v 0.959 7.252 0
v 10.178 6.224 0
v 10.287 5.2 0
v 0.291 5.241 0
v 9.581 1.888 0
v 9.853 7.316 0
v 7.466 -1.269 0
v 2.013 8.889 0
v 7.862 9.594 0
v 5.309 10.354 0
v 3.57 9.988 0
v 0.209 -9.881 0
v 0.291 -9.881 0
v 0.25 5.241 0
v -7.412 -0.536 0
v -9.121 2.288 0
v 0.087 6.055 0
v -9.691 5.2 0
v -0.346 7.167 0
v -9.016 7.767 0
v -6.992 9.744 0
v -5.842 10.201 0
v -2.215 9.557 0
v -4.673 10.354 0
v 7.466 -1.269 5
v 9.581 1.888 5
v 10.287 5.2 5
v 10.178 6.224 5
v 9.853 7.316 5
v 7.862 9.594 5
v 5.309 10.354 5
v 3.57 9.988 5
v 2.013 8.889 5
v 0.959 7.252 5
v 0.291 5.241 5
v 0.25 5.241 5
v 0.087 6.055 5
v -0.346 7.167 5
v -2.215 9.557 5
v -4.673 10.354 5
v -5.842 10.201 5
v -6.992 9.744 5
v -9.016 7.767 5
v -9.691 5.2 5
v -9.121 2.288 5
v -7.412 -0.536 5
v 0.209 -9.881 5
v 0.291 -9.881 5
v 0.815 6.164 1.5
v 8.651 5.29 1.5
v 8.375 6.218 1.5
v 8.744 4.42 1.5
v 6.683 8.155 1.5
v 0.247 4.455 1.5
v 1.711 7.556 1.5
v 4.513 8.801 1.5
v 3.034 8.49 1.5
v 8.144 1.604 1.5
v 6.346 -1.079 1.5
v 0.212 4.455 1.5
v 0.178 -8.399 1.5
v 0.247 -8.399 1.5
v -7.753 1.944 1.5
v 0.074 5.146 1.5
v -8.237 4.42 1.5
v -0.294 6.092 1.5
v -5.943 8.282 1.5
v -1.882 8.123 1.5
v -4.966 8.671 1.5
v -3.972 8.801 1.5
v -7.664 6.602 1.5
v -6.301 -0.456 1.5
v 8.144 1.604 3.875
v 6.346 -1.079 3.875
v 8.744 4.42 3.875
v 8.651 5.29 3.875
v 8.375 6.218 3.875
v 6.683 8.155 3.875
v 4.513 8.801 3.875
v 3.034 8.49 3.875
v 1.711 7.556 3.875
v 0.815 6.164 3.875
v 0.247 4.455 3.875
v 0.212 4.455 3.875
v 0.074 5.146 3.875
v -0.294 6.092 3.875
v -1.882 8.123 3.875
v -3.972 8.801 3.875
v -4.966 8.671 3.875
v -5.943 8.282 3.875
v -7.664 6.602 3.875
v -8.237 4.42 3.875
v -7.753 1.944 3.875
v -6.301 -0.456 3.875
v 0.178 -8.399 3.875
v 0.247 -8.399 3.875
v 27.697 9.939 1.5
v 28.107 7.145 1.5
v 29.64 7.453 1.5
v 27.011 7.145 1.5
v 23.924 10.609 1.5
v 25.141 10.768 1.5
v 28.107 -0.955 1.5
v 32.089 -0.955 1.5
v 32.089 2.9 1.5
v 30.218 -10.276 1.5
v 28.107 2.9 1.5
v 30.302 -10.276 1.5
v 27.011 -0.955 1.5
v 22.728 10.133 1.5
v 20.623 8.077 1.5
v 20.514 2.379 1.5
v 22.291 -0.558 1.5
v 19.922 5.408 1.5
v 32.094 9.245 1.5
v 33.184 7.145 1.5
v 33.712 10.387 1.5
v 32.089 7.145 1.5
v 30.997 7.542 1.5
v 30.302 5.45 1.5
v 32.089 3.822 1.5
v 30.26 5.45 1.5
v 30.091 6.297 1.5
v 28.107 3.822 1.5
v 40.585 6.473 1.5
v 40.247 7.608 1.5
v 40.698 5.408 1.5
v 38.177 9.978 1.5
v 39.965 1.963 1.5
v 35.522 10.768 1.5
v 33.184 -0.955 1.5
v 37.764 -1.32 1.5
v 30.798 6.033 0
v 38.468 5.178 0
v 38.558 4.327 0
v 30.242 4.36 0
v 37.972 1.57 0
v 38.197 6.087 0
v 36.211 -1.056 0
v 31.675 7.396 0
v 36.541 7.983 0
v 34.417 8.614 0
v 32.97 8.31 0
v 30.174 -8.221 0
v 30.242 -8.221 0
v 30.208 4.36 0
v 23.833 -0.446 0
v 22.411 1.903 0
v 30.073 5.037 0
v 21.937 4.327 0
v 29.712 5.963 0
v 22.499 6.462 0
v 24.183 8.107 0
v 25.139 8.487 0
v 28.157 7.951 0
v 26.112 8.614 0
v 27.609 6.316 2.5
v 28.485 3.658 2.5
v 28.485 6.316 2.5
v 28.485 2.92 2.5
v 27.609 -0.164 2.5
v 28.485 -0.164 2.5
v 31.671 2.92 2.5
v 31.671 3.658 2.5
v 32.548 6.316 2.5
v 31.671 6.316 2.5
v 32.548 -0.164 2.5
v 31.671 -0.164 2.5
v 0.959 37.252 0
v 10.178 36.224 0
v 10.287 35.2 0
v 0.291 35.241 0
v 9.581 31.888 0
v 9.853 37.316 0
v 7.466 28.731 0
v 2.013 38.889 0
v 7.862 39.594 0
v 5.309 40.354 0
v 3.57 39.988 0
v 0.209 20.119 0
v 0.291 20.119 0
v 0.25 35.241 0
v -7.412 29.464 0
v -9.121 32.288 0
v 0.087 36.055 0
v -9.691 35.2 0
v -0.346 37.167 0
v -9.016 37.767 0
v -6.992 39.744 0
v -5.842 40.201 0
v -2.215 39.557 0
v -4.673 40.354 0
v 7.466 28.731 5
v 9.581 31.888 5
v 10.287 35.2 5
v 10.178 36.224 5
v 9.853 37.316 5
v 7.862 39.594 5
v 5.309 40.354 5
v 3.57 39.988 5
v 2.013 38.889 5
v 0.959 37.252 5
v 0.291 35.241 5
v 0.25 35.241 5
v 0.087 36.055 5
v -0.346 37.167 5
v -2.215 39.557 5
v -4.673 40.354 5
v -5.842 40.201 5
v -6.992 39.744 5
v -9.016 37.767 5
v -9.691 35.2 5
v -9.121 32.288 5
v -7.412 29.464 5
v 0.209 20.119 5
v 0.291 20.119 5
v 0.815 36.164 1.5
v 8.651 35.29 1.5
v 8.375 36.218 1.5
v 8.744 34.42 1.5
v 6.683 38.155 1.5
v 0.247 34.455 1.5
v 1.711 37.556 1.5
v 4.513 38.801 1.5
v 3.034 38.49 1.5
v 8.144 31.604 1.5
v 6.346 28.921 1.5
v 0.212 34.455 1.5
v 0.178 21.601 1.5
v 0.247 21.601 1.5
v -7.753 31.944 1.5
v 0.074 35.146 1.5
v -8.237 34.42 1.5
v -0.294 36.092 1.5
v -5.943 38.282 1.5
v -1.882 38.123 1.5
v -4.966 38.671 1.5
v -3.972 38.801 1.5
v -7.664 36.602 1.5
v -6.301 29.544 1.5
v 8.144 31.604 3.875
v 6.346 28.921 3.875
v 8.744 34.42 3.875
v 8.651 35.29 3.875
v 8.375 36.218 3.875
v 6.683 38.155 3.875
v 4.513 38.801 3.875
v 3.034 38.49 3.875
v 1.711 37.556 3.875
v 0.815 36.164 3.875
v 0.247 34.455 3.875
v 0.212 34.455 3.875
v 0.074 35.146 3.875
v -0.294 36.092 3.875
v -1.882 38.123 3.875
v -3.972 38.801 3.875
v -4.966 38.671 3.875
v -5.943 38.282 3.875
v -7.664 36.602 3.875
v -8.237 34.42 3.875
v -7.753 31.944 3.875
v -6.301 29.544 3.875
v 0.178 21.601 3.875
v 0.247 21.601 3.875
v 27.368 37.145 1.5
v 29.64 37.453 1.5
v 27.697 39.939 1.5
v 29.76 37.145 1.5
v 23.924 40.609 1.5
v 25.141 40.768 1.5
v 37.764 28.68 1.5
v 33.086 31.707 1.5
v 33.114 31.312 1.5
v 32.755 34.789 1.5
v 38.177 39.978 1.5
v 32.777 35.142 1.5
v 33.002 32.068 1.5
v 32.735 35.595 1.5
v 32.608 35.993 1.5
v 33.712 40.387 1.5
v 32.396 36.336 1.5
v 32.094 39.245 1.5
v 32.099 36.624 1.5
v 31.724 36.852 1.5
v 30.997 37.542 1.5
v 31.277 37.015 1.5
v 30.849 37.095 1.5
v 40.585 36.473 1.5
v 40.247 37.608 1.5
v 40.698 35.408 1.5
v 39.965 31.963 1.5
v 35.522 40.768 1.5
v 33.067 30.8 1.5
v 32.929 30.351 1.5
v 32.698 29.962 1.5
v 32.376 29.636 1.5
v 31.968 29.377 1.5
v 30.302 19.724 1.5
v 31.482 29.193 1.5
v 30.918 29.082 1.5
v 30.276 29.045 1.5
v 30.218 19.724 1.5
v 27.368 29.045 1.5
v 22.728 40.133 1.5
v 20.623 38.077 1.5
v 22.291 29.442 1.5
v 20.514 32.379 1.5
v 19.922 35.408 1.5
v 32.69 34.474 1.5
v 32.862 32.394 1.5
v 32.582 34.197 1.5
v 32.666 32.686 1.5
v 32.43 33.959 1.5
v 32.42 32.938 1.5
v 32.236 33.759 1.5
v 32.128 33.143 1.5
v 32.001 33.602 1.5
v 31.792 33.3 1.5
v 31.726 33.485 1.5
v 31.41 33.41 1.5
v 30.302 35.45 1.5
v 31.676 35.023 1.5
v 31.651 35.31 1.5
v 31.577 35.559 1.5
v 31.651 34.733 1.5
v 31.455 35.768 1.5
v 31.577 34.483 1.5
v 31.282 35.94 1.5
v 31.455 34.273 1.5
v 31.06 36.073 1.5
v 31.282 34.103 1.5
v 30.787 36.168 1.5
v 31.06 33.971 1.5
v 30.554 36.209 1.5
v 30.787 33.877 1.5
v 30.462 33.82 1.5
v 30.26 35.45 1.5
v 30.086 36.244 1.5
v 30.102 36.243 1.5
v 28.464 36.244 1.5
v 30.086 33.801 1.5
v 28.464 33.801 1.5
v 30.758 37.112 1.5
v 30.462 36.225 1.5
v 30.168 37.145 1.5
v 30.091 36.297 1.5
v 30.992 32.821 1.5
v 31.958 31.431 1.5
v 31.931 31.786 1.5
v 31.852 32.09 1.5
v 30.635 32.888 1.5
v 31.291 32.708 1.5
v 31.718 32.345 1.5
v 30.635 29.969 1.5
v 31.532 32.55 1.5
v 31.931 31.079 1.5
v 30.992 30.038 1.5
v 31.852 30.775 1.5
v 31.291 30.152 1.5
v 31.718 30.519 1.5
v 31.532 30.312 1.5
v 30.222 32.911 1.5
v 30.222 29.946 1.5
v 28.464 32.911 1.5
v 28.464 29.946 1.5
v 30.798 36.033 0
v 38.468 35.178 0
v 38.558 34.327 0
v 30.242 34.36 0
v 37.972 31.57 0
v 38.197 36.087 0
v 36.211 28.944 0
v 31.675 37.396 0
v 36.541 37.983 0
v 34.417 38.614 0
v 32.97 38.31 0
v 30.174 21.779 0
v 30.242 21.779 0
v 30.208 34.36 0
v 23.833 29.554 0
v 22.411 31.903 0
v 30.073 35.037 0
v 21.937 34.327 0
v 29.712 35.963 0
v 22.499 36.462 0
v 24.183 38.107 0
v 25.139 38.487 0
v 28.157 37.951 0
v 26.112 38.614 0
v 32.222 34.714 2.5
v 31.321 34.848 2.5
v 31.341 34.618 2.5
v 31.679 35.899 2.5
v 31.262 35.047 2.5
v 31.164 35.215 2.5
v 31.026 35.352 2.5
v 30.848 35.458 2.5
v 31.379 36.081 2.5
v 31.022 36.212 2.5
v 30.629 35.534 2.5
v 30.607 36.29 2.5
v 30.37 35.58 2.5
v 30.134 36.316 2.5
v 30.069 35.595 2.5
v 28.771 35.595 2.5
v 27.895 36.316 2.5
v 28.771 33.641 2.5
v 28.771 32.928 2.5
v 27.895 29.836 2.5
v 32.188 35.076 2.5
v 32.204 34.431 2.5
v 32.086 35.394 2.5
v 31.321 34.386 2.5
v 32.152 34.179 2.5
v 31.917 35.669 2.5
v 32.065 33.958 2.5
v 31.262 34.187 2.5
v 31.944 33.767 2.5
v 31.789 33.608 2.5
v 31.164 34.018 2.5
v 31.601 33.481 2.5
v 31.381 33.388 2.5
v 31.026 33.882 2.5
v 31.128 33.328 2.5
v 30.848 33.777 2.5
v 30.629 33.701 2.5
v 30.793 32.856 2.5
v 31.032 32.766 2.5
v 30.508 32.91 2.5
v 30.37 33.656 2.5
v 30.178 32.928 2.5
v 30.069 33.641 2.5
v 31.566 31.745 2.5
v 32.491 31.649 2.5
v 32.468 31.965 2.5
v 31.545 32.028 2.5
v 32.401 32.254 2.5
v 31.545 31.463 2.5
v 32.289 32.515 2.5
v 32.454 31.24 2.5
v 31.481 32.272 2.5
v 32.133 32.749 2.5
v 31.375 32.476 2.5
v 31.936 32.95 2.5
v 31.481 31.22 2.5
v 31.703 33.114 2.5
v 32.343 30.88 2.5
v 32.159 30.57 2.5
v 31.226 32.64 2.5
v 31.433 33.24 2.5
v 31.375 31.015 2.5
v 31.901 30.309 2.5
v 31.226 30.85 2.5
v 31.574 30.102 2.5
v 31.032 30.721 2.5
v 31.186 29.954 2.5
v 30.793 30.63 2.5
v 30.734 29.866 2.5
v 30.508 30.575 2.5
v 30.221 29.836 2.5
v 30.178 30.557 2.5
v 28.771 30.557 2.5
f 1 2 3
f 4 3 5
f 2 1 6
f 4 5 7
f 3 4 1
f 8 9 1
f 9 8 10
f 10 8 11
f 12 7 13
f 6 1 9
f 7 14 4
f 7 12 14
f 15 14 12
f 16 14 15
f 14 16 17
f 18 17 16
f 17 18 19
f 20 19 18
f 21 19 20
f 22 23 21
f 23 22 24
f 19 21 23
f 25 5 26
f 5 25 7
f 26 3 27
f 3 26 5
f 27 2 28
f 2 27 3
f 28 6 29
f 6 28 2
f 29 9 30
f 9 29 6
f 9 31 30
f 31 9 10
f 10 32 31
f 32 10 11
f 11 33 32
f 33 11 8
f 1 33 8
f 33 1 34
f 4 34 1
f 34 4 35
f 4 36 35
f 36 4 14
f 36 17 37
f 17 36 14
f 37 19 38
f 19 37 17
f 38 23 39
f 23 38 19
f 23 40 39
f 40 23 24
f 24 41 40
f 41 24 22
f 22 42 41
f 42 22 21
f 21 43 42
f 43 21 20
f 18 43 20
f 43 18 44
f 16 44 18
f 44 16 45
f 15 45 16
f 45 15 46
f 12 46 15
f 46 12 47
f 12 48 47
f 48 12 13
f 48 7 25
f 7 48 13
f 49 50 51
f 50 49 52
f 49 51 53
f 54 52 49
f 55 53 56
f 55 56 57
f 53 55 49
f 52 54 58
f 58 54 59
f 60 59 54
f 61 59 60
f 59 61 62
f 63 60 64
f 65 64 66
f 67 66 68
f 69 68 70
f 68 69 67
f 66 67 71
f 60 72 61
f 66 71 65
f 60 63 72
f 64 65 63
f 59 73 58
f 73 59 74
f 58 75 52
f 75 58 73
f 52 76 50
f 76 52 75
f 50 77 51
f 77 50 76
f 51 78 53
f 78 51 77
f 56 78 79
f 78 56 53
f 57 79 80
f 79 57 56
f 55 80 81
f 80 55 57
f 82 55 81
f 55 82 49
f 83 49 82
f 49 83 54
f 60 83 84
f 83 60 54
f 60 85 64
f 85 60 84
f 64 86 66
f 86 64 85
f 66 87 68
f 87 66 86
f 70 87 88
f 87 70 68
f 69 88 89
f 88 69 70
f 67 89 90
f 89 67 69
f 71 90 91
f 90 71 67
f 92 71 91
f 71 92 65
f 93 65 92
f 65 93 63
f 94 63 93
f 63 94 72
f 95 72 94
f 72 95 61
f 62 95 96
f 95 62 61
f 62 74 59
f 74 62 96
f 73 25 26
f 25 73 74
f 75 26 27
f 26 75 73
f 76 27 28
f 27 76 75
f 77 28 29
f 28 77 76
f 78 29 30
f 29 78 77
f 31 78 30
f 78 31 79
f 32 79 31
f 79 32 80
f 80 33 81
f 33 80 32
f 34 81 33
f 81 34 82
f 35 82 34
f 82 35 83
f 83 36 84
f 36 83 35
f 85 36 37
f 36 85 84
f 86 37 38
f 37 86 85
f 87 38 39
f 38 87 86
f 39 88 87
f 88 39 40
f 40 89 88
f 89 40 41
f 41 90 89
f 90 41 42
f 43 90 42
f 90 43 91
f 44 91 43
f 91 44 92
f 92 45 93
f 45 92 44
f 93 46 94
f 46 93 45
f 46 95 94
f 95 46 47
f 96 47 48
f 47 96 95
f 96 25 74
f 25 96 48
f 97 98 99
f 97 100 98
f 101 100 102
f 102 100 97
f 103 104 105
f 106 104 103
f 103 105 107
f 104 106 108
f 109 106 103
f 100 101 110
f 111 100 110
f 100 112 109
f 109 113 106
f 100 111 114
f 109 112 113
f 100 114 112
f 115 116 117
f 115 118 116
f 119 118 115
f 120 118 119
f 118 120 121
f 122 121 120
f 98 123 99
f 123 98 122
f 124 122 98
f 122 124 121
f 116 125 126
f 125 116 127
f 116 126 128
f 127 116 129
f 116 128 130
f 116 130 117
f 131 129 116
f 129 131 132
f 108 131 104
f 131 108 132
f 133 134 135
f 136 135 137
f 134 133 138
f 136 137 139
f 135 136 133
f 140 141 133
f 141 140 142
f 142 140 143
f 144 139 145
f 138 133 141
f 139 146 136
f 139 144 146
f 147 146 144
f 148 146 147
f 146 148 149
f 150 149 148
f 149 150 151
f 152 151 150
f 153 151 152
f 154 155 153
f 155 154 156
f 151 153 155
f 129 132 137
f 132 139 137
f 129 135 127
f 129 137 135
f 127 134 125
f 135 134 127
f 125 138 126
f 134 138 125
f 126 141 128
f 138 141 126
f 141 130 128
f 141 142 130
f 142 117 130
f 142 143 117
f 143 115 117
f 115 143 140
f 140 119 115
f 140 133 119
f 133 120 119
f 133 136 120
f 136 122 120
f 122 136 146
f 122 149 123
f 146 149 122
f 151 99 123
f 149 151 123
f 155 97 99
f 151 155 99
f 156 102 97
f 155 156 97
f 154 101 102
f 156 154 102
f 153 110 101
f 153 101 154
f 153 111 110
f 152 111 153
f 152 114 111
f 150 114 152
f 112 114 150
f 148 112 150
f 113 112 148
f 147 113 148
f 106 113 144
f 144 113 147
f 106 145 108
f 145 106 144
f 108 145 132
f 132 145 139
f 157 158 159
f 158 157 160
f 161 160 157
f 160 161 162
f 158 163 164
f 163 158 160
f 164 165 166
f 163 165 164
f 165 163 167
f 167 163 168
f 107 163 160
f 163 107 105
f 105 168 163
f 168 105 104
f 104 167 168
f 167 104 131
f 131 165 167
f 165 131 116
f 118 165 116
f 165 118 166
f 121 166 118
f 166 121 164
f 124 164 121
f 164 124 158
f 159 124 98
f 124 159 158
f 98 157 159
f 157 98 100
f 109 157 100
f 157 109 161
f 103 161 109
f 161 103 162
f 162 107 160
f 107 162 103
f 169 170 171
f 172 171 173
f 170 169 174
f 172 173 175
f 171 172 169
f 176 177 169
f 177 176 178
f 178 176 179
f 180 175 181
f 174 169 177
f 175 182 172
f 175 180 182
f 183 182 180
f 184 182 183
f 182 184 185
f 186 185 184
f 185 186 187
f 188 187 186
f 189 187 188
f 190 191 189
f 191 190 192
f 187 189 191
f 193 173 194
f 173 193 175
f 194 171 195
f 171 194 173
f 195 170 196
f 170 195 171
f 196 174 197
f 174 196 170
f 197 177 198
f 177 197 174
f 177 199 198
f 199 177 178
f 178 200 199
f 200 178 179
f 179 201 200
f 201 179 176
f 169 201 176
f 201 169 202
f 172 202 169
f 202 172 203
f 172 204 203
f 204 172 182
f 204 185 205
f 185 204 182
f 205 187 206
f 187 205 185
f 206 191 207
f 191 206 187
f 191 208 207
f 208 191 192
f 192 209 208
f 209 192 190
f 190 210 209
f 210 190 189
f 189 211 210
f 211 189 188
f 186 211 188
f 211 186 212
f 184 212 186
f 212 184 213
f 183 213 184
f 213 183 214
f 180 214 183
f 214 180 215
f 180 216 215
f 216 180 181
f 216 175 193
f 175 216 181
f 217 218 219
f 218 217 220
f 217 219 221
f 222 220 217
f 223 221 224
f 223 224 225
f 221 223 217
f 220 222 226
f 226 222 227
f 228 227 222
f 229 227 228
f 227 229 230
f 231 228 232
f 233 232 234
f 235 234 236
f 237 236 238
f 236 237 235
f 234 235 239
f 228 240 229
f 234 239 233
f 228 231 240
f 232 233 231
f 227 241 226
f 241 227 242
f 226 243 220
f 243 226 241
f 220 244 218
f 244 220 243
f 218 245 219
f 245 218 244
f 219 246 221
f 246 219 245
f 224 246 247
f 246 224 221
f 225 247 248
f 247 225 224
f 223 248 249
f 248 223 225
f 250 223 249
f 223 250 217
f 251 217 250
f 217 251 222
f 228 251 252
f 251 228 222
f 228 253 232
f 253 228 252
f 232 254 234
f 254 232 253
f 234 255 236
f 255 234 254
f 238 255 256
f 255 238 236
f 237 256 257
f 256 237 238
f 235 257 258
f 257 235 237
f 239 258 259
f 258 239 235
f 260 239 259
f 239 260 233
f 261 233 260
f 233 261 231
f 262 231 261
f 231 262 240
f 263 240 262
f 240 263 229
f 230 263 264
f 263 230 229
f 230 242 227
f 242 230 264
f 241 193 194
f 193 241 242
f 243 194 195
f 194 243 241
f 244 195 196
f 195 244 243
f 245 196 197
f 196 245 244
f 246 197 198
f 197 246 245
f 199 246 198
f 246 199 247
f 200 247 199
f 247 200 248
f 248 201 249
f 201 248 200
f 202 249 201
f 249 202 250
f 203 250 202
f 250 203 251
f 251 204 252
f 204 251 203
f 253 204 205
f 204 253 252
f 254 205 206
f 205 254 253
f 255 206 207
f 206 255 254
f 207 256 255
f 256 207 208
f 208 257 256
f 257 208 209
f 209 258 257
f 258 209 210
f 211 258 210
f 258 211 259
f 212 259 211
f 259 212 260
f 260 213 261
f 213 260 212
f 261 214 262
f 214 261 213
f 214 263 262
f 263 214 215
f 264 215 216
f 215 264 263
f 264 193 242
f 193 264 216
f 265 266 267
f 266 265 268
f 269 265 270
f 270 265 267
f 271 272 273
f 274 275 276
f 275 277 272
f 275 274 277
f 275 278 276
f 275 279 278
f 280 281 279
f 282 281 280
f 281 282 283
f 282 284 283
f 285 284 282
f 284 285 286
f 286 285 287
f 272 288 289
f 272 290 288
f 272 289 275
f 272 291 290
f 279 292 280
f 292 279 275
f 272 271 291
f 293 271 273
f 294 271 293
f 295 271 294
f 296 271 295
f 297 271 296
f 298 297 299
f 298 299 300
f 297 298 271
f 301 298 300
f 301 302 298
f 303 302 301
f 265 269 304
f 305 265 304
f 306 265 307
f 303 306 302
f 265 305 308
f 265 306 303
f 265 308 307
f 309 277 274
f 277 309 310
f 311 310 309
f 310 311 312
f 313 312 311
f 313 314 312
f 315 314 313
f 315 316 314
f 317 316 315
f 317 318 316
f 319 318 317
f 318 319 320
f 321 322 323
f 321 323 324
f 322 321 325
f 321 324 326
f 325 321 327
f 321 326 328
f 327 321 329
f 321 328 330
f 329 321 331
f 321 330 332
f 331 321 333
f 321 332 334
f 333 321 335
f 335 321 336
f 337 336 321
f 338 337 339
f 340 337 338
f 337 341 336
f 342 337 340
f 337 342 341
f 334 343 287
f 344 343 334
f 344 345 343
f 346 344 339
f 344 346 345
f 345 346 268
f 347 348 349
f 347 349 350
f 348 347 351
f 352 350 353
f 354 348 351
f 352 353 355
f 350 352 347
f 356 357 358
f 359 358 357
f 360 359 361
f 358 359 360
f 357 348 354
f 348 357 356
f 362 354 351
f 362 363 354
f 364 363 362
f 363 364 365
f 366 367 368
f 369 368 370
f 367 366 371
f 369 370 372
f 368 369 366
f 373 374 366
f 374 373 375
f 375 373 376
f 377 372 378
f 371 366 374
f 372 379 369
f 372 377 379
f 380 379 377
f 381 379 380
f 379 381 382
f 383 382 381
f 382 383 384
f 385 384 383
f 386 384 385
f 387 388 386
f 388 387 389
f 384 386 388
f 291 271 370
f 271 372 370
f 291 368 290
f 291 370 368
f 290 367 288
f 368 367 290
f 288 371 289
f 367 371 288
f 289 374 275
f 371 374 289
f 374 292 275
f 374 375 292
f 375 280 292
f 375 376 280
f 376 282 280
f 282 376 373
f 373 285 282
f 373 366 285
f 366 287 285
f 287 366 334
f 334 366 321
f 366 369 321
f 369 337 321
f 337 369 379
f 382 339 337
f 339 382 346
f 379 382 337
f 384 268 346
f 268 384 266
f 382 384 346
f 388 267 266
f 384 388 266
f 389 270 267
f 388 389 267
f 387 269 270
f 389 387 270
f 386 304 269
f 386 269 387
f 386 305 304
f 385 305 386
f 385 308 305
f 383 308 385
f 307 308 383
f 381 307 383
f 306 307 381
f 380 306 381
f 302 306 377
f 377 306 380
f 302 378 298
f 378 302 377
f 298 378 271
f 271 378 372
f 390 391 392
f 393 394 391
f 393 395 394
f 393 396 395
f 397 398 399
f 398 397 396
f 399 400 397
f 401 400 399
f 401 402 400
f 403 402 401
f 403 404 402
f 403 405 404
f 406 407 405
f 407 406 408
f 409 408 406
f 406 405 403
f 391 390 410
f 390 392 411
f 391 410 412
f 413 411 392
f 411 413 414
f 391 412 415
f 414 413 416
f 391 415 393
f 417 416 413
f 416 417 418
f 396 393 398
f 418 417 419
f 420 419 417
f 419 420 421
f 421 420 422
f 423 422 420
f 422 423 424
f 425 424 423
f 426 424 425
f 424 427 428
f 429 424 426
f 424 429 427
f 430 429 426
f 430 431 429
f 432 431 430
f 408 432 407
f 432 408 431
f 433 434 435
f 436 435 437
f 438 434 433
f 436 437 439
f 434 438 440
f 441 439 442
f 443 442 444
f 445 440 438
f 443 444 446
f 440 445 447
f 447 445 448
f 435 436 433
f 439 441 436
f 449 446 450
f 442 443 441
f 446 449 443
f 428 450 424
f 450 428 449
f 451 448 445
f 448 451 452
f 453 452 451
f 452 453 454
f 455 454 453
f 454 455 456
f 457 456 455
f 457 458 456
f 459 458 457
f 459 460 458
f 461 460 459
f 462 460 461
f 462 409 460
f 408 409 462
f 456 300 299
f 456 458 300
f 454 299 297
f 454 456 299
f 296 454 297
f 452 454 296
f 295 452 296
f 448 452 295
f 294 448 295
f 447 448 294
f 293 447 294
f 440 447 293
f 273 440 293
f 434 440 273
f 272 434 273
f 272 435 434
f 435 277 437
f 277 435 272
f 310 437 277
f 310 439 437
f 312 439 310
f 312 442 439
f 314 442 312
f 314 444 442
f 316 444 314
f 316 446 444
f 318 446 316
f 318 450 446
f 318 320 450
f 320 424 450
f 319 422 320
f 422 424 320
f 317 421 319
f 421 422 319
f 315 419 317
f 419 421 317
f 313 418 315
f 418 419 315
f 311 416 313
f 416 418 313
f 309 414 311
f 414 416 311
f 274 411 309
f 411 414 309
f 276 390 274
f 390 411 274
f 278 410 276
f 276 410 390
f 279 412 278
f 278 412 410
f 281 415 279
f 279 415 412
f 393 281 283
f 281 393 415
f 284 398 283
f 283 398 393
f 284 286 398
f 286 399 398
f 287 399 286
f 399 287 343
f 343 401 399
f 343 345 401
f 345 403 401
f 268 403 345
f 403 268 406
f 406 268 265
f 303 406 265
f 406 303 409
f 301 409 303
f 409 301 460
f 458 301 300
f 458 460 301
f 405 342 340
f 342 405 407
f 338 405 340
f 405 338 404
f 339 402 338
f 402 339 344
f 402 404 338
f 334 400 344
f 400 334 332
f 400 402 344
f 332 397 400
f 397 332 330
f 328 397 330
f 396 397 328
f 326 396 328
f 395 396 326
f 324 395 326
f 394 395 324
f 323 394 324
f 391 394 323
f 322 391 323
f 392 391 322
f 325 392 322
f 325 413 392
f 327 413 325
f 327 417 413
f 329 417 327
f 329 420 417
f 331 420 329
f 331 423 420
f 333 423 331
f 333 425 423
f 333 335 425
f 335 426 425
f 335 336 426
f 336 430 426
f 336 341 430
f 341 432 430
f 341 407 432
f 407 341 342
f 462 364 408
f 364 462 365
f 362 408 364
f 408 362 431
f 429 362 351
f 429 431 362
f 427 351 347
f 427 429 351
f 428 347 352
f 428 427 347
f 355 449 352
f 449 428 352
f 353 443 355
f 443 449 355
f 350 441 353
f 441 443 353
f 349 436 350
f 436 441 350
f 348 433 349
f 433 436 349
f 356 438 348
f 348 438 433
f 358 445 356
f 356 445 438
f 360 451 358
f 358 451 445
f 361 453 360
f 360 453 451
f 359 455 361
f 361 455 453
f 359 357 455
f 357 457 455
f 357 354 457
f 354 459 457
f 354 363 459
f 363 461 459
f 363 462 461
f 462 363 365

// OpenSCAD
x=20;
y=20;
z=5;
a=1.5;
t=0.4;
ts=1; // text size
floral_heart="\u2766";
heart="\u2665";
f="Arial Unicode MS";

module heart(l,w,h,shrink=1.0){
    linear_extrude(height=h,scale=shrink){
        scale([l,w,0]){
            text(heart,font=f,halign="center",valign="center",size=1);
        }
    }
}


module heartbox(name){
    //Reference
    translate([10,10,10]){
    //    cube([10,10,10]);
    }

    // box
    difference(){
        heart(x,y,z);
        translate([0,0,a]){
            heart(x-a*2,y-a*2,z);
        }
        translate([0,0,z]){
            mirror([0,0,1]){
                heart(x,y,a,0.8);
            }
        }
    }

    // Top
    translate([x*1.5,0,a]){
        mirror([0,0,1]){
            union(){
                heart(x+t*2,y+t*2,a,0.8);
                translate([0,3,0]){
                    mirror([0,0,1]){
                        linear_extrude(height=ts,scale=0.8){
                            text(name,font=f,halign="center",valign="center",size=8);
                        }
                    }
                }
        //        translate([0,0,a]){
        //            heart(x-a*2-t*2,y-a*2-t*2,a,shrink=0.8);
        //        }
            }
        }
    }
}

heartbox("H");
translate([0,y*1.5,0]){
    heartbox("B");
}
